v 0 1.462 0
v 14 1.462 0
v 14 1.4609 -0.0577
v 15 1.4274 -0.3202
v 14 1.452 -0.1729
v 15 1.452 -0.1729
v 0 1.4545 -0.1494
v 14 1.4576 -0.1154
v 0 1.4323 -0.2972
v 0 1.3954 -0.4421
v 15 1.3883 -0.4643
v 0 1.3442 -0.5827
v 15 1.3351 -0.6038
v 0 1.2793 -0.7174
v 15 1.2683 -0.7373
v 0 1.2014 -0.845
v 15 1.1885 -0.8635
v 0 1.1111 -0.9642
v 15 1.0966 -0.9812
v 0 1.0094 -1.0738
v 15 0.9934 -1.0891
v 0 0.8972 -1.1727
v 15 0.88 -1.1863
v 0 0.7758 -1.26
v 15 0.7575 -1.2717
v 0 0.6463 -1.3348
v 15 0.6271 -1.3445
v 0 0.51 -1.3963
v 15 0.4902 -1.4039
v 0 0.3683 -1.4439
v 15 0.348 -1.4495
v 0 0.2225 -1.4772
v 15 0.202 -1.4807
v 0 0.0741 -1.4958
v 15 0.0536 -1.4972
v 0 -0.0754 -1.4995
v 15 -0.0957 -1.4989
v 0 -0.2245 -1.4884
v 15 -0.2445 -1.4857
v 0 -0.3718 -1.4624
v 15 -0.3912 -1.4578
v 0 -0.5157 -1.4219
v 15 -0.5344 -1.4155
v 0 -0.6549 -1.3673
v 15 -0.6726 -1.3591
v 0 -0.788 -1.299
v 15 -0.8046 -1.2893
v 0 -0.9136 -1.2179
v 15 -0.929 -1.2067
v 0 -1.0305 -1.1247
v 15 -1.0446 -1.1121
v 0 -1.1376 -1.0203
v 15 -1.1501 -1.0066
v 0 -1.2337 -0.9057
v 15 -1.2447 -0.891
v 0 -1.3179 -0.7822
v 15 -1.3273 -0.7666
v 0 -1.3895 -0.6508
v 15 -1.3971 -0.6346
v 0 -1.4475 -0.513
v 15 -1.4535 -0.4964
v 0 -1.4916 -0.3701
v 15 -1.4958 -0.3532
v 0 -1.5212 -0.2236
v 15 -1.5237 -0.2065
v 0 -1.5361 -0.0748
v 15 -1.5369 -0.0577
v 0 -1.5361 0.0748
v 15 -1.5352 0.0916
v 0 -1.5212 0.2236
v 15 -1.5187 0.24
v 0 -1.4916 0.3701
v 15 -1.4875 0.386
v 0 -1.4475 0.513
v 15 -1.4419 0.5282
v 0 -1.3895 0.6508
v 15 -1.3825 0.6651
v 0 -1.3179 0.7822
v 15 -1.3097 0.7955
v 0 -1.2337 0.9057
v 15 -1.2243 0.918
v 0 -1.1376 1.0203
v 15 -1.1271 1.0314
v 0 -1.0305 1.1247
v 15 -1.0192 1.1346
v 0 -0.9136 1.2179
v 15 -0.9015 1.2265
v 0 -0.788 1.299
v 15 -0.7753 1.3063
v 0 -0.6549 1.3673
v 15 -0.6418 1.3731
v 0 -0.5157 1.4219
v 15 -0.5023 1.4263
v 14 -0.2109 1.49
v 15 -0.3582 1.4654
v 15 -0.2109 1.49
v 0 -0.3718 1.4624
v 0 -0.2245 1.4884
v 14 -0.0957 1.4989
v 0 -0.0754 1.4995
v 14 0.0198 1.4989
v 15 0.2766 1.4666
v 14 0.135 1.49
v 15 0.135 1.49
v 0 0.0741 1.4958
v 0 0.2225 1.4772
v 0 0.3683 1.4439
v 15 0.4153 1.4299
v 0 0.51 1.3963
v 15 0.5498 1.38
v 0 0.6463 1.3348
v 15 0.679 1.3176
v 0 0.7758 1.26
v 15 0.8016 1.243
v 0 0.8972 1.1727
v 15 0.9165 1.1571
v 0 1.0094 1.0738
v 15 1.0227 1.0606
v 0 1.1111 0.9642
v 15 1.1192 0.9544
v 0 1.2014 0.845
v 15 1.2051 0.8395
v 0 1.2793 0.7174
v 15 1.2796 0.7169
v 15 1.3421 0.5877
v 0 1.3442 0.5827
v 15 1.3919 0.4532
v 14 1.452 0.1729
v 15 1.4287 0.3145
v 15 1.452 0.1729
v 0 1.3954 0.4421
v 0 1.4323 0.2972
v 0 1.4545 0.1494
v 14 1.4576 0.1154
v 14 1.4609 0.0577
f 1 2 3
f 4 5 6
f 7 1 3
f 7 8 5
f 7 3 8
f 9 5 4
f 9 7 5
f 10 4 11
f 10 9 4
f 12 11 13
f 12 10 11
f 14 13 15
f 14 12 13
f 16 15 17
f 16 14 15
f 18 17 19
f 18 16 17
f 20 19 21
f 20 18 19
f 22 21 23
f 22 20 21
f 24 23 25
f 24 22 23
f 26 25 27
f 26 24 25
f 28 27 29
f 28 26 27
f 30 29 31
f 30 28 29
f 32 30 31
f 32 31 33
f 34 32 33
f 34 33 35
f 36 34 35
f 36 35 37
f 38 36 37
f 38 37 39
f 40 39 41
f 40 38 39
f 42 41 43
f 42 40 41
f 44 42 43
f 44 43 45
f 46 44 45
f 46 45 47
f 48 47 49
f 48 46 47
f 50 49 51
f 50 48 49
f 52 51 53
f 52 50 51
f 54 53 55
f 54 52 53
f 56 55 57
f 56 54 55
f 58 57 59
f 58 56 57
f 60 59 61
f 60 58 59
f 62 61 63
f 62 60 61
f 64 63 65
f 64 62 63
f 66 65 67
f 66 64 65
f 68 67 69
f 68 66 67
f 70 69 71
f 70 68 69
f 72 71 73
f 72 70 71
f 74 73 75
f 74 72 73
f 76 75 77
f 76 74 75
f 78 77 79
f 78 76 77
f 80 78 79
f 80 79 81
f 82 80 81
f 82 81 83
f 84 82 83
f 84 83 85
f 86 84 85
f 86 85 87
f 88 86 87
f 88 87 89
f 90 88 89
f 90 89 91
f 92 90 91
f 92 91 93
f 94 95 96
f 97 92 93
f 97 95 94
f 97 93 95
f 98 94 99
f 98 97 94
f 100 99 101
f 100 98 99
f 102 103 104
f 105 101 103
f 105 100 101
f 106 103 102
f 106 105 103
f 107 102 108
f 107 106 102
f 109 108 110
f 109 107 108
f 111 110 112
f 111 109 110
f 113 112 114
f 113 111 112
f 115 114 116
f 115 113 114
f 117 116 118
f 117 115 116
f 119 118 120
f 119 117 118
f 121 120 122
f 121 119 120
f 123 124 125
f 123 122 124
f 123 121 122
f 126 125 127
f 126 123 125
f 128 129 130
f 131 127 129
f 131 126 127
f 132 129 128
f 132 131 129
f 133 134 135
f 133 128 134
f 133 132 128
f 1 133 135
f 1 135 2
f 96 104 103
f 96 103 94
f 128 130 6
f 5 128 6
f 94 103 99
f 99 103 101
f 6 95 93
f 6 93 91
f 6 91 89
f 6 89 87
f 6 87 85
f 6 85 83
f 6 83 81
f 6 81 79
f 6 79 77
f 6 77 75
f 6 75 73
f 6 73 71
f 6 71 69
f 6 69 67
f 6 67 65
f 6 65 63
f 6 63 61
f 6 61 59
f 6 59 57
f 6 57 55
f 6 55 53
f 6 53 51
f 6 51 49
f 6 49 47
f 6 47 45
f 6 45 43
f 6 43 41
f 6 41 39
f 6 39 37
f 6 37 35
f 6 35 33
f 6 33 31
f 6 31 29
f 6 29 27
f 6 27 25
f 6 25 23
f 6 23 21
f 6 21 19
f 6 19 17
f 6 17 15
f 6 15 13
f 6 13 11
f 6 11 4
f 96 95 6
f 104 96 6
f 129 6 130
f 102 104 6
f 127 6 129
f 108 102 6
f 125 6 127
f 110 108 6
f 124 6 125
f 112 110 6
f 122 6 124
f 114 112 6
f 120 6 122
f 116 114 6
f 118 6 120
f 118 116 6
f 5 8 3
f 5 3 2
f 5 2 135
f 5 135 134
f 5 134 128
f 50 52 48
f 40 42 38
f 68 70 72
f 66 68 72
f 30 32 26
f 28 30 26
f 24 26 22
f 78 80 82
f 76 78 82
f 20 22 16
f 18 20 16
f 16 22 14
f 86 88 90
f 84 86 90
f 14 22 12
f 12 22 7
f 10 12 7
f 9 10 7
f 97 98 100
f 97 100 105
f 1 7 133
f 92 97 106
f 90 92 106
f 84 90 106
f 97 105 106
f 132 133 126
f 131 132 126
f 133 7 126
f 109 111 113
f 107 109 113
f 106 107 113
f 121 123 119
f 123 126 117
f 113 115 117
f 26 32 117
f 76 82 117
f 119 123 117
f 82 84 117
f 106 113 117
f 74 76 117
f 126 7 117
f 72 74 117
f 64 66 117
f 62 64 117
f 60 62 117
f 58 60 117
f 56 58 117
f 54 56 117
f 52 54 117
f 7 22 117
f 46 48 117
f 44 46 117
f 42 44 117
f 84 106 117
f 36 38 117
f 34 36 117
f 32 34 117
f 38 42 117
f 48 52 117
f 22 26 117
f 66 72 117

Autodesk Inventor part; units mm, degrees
ref_plane "YZ Plane" through (0, 0, 0) normal (1, 0, 0) x (0, 1, 0)
ref_plane "XZ Plane" through (0, 0, 0) normal (0, 1, 0) x (-1, 0, 0)
ref_plane "XY Plane" through (0, 0, 0) normal (0, 0, 1) x (1, 0, 0)
sketch "Sketch1" plane through (0, 0, 0) normal (1, 0, 0) x (0, 1, 0)
  circle A0 centre (-0.038, 0) radius 1.5
  point P0 (0, 0)
  dimension "d0" = 3
extrude "Extrusion1" add sketch "Sketch1" along normal blind 15
sketch "Sketch2" plane through (15, -0.038, 0) normal (1, 0, 0) x (0, 0, -1)
  circle A0 centre (0, 0) radius 1.5 projected
  line L0 (-0.1729, 1.49) -> (0.1729, 1.49)
  point P0 (0, 0.038)
  point P1 (0, 1.49)
  dimension "d3" = 1.49
extrude "Extrusion2" cut sketch "Sketch2" against normal blind 1 contours L0 A0 picked at (-0.0192, 1.493)
sketch "Sketch3" plane through (15, 0, 0) normal (1, 0, 0) x (0, 0, -1)
  point P0 (0, 0)
sketch "Sketch4" plane through (15, 0, 0) normal (1, 0, 0) x (0, 0, -1)
  arc A0 (-0.1729, 1.452) -> (0.1729, 1.452) centre (0, -0.038) ccw projected
  line L0 (-1.49, 0.135) -> (-1.49, -0.2109)
  line L1 (0.1729, 1.452) -> (-0.1729, 1.452) projected
  point P0 (0, 0)
  point P1 (-1.49, -0.038)
  dimension "d6" = 1.49
extrude "Extrusion3" cut sketch "Sketch4" against normal blind 1 contours L0 A0
properties part number "pin" material "Steel"
